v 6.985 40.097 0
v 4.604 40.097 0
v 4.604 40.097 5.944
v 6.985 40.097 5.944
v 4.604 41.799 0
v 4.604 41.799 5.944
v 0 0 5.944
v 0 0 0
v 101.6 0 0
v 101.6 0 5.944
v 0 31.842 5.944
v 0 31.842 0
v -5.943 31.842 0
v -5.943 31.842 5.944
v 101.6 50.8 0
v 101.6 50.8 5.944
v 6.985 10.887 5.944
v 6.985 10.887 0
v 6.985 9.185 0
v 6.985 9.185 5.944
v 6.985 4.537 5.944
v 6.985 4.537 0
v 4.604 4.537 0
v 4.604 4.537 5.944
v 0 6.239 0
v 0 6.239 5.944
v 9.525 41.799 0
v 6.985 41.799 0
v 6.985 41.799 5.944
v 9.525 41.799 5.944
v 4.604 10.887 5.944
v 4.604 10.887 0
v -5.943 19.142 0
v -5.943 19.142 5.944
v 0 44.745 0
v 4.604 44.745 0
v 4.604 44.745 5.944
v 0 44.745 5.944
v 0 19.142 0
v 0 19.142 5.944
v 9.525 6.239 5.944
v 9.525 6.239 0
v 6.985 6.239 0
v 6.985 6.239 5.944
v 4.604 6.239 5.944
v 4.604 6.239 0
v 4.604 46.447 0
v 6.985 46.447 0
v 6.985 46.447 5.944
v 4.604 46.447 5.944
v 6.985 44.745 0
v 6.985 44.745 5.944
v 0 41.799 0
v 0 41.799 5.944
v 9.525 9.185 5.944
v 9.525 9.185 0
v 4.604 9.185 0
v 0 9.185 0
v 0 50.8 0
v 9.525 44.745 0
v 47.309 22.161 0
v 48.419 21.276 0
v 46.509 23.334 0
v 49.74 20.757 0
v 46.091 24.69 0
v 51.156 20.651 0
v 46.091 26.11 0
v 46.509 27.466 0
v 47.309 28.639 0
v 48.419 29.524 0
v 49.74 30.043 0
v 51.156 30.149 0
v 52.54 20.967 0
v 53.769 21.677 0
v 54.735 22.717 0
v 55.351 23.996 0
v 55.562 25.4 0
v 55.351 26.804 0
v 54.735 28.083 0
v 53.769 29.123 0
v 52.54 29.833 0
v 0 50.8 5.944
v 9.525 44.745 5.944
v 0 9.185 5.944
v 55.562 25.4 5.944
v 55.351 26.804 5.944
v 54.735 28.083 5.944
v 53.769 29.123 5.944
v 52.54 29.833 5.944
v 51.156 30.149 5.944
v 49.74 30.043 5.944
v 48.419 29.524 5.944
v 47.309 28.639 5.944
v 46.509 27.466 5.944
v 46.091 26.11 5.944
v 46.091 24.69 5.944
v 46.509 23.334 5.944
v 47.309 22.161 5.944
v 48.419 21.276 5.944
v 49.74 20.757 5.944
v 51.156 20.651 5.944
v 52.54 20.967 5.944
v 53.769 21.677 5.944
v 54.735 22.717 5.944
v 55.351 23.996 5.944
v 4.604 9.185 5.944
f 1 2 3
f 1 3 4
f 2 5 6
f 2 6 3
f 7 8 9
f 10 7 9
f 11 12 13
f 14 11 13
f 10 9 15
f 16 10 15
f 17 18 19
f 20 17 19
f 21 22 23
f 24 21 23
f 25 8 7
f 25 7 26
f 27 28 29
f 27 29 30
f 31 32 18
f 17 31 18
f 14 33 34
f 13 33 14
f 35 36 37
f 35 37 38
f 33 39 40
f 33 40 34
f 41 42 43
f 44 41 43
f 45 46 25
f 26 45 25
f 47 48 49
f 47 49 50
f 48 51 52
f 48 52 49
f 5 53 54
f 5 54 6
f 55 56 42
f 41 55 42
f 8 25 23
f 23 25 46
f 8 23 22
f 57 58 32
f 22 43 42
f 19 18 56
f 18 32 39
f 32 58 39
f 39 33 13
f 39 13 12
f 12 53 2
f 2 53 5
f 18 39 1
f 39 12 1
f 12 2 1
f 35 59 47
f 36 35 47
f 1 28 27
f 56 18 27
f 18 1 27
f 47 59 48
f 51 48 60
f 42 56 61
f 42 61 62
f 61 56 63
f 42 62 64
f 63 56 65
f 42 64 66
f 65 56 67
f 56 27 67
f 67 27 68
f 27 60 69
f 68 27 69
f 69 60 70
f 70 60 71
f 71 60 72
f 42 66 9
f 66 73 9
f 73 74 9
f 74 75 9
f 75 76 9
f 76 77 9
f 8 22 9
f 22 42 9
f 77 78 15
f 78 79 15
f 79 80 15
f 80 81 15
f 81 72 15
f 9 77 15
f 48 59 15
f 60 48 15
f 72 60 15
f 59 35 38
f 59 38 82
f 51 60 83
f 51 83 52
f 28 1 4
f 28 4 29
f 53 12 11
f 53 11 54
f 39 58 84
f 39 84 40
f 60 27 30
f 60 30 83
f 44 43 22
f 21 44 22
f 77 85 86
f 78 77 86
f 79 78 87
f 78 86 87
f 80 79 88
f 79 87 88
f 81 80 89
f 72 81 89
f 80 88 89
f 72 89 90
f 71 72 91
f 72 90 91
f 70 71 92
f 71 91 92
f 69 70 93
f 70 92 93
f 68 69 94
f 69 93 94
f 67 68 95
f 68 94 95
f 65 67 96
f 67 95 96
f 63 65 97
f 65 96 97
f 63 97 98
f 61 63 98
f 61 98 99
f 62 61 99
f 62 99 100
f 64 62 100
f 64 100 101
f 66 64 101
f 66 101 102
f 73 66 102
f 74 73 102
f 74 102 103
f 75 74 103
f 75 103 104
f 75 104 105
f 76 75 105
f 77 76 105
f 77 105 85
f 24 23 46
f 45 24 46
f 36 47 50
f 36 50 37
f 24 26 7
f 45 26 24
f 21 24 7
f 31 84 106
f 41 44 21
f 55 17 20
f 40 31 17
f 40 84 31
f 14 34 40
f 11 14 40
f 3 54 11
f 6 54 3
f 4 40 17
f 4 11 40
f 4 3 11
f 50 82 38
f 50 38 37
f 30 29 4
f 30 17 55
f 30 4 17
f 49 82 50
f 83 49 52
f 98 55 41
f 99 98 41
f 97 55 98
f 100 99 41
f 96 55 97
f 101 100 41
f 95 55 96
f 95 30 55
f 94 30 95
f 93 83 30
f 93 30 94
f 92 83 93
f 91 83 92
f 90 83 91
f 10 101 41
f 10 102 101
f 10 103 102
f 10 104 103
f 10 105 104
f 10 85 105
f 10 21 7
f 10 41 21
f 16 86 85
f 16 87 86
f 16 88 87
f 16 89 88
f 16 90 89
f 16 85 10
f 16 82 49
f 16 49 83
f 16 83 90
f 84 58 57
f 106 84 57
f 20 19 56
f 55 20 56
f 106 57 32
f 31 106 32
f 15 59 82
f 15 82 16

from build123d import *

# Parameters (mm, degrees)
SKETCH1_W           = 101.6
SKETCH1_H           = 50.8
BOSS_EXTRUDE1_DEPTH = 5.9436
SKETCH2_R           = 4.7625
CUT_EXTRUDE1_DEPTH  = 6.9436
SKETCH3_W           = 5.94334
SKETCH3_H           = 12.7
BOSS_EXTRUDE2_DEPTH = 5.9436
CUT_EXTRUDE2_DEPTH  = 6.9436


with BuildPart() as part:
    # Sketch1 → Boss-Extrude1 (new body)
    with BuildSketch(Plane.XY):
        with Locations((50.8, 25.4)):
            Rectangle(SKETCH1_W, SKETCH1_H)
    extrude(amount=BOSS_EXTRUDE1_DEPTH)

    # Sketch2 → Cut-Extrude1 (cut, through all)
    with BuildSketch(Plane.XY.offset(5.9436)):
        with Locations((50.8, 25.4)):
            Circle(SKETCH2_R)
    extrude(amount=-CUT_EXTRUDE1_DEPTH, mode=Mode.SUBTRACT)

    # Sketch3 → Boss-Extrude2 (add)
    with BuildSketch(Plane(origin=(0, 0, 0), x_dir=(-1, 0, 0), z_dir=(0, 0, -1))):
        with Locations((2.97167, 25.492131347)):
            Rectangle(SKETCH3_W, SKETCH3_H)
    extrude(amount=-BOSS_EXTRUDE2_DEPTH)

    # Sketch5 → Cut-Extrude2 (cut, through all)
    with BuildSketch(Plane(origin=(0, 0, 0), x_dir=(-1, 0, 0), z_dir=(0, 0, -1))):
        Polygon((0, 41.798931347), (-4.60401, 41.798931347), (-4.60401, 40.097131347), (-6.98526, 40.097131347), (-6.98526, 41.798931347), (-9.52526, 41.798931347), (-9.52526, 44.745331347), (-6.98526, 44.745331347), (-6.98526, 46.447131347), (-4.60401, 46.447131347), (-4.60401, 44.745331347), (0, 44.745331347), align=None)
        Polygon((-4.60401, 4.537131347), (-4.60401, 6.238931347), (0, 6.238931347), (0, 9.185331347), (-4.60401, 9.185331347), (-4.60401, 10.887131347), (-6.98526, 10.887131347), (-6.98526, 9.185331347), (-9.52526, 9.185331347), (-9.52526, 6.238931347), (-6.98526, 6.238931347), (-6.98526, 4.537131347), align=None)
    extrude(amount=-CUT_EXTRUDE2_DEPTH, mode=Mode.SUBTRACT)


solid = part.part
